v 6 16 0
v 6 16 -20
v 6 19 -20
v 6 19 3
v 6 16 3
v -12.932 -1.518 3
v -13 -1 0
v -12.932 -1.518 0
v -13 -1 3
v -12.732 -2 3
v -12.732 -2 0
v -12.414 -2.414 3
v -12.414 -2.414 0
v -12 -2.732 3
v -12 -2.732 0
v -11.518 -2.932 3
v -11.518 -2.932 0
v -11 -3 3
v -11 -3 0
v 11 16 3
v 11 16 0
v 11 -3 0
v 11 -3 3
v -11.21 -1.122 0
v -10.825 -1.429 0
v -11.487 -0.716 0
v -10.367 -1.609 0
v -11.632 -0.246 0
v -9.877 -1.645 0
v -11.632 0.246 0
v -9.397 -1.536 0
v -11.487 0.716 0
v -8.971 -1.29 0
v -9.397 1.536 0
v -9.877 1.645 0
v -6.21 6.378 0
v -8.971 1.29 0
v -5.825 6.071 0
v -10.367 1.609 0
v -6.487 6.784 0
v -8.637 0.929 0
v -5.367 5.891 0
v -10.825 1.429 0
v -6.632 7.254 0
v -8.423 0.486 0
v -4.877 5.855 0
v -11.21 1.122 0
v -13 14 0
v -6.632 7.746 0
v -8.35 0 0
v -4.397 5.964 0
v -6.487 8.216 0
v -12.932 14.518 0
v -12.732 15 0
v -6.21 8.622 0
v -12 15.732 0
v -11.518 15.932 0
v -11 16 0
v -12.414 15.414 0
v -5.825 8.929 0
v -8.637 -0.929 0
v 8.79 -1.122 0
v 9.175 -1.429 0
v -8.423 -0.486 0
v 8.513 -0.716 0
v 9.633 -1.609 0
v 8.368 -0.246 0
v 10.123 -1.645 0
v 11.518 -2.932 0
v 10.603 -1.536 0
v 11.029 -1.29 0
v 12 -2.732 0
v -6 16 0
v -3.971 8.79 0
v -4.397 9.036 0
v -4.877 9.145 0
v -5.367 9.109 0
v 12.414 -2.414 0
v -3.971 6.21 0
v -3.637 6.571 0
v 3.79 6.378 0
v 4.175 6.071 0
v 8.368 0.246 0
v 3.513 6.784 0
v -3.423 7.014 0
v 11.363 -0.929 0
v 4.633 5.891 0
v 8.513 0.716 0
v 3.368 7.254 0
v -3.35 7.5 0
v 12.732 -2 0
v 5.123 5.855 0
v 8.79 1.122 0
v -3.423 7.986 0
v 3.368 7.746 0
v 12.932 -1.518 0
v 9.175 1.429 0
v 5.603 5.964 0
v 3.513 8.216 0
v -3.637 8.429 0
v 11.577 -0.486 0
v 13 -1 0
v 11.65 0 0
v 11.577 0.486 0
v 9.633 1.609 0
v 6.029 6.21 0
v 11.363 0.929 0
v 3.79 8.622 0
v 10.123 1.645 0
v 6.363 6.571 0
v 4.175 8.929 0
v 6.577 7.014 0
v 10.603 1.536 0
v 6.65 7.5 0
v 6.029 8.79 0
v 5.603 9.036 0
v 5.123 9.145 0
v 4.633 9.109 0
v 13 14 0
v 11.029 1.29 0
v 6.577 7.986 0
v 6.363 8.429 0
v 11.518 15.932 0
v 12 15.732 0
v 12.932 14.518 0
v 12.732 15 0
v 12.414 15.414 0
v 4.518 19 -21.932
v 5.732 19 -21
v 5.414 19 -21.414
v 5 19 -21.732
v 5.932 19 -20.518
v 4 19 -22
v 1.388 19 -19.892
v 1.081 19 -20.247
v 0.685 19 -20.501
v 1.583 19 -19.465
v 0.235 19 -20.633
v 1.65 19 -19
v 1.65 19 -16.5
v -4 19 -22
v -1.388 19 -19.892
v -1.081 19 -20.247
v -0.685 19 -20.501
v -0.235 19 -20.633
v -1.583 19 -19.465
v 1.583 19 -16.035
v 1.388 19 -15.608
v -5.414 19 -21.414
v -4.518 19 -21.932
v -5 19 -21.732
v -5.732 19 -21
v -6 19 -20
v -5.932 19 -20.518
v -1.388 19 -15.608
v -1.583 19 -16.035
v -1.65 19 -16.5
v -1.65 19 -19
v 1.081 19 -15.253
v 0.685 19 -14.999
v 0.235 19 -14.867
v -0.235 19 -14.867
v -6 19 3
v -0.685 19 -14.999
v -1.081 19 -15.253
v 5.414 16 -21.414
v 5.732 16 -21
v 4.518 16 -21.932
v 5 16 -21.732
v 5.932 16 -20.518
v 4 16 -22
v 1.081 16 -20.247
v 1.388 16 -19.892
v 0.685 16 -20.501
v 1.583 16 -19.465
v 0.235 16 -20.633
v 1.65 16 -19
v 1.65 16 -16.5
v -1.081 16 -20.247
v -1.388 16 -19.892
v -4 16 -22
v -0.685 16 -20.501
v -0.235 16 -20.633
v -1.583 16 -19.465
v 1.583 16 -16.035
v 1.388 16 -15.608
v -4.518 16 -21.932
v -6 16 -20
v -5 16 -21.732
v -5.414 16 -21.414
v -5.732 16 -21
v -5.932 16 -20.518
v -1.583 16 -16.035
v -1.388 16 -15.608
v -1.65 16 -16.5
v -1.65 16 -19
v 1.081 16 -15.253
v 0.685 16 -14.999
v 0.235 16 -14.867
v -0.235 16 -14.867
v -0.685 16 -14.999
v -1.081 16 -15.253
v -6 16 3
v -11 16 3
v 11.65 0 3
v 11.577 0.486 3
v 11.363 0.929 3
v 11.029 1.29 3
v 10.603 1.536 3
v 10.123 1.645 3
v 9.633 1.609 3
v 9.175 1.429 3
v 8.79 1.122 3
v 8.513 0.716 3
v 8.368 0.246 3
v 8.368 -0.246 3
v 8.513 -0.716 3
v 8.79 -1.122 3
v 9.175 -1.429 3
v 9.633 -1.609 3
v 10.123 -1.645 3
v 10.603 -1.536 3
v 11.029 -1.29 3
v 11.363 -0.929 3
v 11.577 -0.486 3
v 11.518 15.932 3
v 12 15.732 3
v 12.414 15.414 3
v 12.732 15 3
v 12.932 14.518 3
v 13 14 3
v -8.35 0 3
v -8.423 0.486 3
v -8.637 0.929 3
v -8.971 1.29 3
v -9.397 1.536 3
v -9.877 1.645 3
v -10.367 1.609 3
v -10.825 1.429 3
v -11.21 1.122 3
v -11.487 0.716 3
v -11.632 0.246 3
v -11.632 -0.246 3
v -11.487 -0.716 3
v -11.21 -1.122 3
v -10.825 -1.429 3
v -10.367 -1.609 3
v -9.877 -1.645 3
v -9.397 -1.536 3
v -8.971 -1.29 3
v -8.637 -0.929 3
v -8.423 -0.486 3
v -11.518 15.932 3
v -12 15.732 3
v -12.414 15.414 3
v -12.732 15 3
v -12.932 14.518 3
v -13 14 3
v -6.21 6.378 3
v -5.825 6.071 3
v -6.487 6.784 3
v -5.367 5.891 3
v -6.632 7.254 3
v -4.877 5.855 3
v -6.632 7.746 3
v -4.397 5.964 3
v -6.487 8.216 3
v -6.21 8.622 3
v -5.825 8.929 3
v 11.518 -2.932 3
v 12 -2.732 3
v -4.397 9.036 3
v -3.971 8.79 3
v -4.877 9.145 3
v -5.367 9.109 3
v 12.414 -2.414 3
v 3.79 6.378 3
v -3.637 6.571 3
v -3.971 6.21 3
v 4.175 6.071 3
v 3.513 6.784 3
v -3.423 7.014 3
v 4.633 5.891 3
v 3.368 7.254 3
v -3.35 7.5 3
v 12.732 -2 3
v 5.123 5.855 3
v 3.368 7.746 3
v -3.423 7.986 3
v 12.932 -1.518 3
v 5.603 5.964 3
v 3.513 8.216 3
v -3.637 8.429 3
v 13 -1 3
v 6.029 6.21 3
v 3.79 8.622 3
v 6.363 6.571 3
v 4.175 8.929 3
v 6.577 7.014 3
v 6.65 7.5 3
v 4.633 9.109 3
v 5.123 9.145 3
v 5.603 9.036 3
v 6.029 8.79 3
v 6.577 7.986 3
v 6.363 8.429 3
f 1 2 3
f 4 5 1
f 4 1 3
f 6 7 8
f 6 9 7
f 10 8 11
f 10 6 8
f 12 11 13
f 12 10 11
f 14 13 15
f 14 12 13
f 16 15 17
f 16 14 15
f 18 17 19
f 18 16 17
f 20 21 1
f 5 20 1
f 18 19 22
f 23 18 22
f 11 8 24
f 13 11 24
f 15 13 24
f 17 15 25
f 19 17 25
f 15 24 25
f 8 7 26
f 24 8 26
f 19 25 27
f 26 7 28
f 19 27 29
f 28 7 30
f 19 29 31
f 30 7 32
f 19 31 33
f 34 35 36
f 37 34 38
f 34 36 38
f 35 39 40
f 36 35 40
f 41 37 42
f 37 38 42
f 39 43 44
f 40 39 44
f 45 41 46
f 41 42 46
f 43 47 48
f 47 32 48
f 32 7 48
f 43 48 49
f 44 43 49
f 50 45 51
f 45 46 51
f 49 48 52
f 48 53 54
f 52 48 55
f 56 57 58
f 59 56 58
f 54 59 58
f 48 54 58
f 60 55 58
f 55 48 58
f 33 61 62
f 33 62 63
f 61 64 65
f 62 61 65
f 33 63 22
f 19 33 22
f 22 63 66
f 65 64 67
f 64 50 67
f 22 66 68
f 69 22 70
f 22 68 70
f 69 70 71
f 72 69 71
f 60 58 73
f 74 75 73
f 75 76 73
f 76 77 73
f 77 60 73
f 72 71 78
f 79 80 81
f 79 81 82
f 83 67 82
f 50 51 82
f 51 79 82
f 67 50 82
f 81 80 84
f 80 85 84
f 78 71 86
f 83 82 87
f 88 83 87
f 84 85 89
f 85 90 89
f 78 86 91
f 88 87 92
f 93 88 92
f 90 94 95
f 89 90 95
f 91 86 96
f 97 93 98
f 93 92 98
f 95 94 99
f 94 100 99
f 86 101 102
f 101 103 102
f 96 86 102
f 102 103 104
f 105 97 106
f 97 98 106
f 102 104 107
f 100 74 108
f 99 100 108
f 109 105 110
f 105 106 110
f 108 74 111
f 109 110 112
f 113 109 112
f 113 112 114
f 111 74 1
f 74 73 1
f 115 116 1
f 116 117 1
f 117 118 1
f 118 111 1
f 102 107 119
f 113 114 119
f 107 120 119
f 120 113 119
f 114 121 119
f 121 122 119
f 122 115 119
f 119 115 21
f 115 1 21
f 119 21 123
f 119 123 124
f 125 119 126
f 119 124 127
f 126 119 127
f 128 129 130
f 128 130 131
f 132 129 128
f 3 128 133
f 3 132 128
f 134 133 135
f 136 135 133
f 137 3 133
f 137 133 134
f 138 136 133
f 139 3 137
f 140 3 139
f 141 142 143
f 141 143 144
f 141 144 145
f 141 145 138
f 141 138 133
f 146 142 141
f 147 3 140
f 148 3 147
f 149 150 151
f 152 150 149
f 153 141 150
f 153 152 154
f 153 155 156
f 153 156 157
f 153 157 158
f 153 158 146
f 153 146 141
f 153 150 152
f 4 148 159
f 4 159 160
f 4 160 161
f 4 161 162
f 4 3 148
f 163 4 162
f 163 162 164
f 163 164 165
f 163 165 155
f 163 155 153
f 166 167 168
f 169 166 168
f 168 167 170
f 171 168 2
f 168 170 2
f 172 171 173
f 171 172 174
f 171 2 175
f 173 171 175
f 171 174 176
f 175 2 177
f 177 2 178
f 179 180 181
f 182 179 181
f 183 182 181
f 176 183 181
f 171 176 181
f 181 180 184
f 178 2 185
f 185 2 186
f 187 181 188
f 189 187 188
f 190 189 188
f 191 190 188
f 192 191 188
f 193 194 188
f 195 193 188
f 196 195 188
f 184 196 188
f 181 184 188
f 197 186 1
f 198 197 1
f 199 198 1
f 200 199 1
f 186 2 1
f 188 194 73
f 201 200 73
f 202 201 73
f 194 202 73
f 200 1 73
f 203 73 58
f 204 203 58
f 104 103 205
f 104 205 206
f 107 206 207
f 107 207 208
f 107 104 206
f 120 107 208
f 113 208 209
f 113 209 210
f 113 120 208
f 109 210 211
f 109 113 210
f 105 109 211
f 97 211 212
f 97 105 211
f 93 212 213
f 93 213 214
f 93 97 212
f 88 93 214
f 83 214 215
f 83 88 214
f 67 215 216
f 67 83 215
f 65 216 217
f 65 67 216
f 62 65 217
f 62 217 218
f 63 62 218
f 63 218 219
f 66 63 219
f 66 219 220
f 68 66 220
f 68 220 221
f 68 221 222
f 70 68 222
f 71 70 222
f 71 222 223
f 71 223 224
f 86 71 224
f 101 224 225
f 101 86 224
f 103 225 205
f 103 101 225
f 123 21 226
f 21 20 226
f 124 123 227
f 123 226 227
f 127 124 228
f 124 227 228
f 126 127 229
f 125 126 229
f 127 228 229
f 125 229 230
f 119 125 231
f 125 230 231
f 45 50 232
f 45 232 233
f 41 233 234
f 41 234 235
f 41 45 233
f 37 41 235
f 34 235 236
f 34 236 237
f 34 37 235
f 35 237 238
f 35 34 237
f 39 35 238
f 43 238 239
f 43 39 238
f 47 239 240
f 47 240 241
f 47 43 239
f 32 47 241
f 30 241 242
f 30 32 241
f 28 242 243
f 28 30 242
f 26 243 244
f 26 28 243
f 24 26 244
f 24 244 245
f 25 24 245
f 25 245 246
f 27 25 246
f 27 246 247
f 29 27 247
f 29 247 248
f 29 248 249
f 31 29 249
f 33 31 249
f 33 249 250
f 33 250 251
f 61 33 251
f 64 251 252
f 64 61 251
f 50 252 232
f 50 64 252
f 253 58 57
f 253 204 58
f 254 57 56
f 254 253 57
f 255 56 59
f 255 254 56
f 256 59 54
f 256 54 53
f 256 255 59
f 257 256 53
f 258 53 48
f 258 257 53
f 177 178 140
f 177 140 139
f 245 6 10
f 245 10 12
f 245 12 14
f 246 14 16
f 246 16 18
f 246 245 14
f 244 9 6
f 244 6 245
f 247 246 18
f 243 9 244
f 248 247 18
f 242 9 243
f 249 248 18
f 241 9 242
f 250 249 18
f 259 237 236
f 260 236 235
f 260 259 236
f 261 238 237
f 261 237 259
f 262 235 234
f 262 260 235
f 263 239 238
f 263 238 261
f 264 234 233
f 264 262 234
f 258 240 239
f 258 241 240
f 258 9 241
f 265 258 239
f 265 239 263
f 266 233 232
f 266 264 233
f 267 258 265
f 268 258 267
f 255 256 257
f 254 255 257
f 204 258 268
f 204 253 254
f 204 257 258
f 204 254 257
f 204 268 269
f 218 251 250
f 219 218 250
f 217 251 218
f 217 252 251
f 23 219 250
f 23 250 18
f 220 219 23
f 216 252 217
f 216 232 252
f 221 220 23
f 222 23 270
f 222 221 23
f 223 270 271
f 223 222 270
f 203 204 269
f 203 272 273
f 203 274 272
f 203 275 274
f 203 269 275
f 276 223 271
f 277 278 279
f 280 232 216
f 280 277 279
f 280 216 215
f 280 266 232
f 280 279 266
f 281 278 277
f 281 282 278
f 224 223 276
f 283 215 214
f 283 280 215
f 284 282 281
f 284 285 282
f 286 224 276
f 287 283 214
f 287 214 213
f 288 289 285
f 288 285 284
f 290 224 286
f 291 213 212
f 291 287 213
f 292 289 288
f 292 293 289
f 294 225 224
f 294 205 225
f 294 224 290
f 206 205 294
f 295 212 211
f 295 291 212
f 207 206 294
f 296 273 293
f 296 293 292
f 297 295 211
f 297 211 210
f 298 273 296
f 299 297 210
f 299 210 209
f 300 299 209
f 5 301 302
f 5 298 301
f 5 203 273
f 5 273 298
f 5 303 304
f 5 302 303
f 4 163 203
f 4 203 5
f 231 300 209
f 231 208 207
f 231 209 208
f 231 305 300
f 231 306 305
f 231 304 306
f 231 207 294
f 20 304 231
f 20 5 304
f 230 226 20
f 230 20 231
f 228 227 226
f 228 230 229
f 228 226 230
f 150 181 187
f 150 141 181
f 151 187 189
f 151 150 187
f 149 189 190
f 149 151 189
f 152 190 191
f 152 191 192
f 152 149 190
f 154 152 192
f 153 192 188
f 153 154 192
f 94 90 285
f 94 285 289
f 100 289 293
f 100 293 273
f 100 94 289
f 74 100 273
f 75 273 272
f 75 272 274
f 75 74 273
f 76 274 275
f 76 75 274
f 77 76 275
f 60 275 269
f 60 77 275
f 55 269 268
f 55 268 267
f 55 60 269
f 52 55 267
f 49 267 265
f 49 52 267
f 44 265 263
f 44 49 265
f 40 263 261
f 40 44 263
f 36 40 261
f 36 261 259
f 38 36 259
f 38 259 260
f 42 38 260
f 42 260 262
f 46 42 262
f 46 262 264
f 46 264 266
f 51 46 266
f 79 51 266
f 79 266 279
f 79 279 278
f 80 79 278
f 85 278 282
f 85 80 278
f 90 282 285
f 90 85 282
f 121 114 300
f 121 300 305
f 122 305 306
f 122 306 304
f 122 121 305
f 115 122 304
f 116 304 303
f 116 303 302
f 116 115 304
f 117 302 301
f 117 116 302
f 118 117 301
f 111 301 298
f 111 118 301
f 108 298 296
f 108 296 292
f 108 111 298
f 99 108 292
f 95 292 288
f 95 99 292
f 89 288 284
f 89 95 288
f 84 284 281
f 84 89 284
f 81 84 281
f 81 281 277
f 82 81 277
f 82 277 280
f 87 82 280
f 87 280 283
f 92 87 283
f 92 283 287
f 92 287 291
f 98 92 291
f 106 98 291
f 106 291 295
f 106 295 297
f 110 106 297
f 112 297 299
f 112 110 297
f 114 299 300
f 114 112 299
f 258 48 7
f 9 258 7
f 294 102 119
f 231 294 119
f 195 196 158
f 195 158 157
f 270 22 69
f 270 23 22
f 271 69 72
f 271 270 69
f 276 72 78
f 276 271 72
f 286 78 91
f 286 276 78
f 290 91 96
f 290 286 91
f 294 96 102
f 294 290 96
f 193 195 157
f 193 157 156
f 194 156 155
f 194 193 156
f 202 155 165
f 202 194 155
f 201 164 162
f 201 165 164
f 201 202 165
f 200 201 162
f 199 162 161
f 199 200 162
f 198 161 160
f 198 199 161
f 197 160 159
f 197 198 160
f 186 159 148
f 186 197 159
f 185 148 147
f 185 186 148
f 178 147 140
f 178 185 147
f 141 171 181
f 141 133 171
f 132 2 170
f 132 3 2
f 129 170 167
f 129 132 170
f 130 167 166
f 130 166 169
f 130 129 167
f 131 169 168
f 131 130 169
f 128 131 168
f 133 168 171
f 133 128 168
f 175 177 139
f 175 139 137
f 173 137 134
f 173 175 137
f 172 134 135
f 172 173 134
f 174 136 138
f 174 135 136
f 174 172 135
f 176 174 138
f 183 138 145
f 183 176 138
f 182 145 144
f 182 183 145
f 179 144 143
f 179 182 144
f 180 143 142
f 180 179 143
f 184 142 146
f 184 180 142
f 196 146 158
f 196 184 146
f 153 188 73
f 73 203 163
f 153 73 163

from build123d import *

# Parameters (mm, degrees)
SKETCH_1_R          = 1.65
EXTRUDE_1_DEPTH     = 3
SKETCH_2_W          = 12
SKETCH_2_H          = 3
EXTRUDE_2_DEPTH     = 22
CUT_EXTRUDE_2_DEPTH = 32
FILLET_1_R          = 2


with BuildPart() as part:
    # 草图1 → 凸台-拉伸1 (new body)
    with BuildSketch(Plane.XY):
        Polygon((-6, 16), (-13, 16), (-13, -3), (13, -3), (13, 16), (6, 16), (6, 19), (-6, 19), align=None)
        with Locations((-10, 0)):
            Circle(SKETCH_1_R, mode=Mode.SUBTRACT)
        with Locations((-5, 7.5)):
            Circle(SKETCH_1_R, mode=Mode.SUBTRACT)
        with Locations((10, 0)):
            Circle(SKETCH_1_R, mode=Mode.SUBTRACT)
        with Locations((5, 7.5)):
            Circle(SKETCH_1_R, mode=Mode.SUBTRACT)
    extrude(amount=EXTRUDE_1_DEPTH)

    # 草图2 → 凸台-拉伸2 (add)
    with BuildSketch(Plane(origin=(0, 0, 0), x_dir=(-1, 0, 0), z_dir=(0, 0, -1))):
        with Locations((0, 17.5)):
            Rectangle(SKETCH_2_W, SKETCH_2_H)
    extrude(amount=EXTRUDE_2_DEPTH)

    # 草图4 → 切除-拉伸2 (cut)
    with BuildSketch(Plane(origin=(0, 0, 0), x_dir=(1, 0, 0), z_dir=(0, 1, 0))):
        with BuildLine():
            Line((-1.65, 19), (-1.65, 16.5))
            ThreePointArc((-1.65, 16.5), (0, 14.85), (1.65, 16.5))
            Line((1.65, 16.5), (1.65, 19))
            ThreePointArc((1.65, 19), (0, 20.65), (-1.65, 19))
        make_face()
    extrude(amount=CUT_EXTRUDE_2_DEPTH, mode=Mode.SUBTRACT)

    # 圆角1
    fillet_1_edges = [part.edges().sort_by_distance(p)[0] for p in [
        (13, -3, 1.5),
        (-13, -3, 1.5),
        (-13, 16, 1.5),
        (13, 16, 1.5),
        (-6, 17.5, -22),
        (6, 17.5, -22),
    ]]
    fillet(fillet_1_edges, radius=FILLET_1_R)


solid = part.part
